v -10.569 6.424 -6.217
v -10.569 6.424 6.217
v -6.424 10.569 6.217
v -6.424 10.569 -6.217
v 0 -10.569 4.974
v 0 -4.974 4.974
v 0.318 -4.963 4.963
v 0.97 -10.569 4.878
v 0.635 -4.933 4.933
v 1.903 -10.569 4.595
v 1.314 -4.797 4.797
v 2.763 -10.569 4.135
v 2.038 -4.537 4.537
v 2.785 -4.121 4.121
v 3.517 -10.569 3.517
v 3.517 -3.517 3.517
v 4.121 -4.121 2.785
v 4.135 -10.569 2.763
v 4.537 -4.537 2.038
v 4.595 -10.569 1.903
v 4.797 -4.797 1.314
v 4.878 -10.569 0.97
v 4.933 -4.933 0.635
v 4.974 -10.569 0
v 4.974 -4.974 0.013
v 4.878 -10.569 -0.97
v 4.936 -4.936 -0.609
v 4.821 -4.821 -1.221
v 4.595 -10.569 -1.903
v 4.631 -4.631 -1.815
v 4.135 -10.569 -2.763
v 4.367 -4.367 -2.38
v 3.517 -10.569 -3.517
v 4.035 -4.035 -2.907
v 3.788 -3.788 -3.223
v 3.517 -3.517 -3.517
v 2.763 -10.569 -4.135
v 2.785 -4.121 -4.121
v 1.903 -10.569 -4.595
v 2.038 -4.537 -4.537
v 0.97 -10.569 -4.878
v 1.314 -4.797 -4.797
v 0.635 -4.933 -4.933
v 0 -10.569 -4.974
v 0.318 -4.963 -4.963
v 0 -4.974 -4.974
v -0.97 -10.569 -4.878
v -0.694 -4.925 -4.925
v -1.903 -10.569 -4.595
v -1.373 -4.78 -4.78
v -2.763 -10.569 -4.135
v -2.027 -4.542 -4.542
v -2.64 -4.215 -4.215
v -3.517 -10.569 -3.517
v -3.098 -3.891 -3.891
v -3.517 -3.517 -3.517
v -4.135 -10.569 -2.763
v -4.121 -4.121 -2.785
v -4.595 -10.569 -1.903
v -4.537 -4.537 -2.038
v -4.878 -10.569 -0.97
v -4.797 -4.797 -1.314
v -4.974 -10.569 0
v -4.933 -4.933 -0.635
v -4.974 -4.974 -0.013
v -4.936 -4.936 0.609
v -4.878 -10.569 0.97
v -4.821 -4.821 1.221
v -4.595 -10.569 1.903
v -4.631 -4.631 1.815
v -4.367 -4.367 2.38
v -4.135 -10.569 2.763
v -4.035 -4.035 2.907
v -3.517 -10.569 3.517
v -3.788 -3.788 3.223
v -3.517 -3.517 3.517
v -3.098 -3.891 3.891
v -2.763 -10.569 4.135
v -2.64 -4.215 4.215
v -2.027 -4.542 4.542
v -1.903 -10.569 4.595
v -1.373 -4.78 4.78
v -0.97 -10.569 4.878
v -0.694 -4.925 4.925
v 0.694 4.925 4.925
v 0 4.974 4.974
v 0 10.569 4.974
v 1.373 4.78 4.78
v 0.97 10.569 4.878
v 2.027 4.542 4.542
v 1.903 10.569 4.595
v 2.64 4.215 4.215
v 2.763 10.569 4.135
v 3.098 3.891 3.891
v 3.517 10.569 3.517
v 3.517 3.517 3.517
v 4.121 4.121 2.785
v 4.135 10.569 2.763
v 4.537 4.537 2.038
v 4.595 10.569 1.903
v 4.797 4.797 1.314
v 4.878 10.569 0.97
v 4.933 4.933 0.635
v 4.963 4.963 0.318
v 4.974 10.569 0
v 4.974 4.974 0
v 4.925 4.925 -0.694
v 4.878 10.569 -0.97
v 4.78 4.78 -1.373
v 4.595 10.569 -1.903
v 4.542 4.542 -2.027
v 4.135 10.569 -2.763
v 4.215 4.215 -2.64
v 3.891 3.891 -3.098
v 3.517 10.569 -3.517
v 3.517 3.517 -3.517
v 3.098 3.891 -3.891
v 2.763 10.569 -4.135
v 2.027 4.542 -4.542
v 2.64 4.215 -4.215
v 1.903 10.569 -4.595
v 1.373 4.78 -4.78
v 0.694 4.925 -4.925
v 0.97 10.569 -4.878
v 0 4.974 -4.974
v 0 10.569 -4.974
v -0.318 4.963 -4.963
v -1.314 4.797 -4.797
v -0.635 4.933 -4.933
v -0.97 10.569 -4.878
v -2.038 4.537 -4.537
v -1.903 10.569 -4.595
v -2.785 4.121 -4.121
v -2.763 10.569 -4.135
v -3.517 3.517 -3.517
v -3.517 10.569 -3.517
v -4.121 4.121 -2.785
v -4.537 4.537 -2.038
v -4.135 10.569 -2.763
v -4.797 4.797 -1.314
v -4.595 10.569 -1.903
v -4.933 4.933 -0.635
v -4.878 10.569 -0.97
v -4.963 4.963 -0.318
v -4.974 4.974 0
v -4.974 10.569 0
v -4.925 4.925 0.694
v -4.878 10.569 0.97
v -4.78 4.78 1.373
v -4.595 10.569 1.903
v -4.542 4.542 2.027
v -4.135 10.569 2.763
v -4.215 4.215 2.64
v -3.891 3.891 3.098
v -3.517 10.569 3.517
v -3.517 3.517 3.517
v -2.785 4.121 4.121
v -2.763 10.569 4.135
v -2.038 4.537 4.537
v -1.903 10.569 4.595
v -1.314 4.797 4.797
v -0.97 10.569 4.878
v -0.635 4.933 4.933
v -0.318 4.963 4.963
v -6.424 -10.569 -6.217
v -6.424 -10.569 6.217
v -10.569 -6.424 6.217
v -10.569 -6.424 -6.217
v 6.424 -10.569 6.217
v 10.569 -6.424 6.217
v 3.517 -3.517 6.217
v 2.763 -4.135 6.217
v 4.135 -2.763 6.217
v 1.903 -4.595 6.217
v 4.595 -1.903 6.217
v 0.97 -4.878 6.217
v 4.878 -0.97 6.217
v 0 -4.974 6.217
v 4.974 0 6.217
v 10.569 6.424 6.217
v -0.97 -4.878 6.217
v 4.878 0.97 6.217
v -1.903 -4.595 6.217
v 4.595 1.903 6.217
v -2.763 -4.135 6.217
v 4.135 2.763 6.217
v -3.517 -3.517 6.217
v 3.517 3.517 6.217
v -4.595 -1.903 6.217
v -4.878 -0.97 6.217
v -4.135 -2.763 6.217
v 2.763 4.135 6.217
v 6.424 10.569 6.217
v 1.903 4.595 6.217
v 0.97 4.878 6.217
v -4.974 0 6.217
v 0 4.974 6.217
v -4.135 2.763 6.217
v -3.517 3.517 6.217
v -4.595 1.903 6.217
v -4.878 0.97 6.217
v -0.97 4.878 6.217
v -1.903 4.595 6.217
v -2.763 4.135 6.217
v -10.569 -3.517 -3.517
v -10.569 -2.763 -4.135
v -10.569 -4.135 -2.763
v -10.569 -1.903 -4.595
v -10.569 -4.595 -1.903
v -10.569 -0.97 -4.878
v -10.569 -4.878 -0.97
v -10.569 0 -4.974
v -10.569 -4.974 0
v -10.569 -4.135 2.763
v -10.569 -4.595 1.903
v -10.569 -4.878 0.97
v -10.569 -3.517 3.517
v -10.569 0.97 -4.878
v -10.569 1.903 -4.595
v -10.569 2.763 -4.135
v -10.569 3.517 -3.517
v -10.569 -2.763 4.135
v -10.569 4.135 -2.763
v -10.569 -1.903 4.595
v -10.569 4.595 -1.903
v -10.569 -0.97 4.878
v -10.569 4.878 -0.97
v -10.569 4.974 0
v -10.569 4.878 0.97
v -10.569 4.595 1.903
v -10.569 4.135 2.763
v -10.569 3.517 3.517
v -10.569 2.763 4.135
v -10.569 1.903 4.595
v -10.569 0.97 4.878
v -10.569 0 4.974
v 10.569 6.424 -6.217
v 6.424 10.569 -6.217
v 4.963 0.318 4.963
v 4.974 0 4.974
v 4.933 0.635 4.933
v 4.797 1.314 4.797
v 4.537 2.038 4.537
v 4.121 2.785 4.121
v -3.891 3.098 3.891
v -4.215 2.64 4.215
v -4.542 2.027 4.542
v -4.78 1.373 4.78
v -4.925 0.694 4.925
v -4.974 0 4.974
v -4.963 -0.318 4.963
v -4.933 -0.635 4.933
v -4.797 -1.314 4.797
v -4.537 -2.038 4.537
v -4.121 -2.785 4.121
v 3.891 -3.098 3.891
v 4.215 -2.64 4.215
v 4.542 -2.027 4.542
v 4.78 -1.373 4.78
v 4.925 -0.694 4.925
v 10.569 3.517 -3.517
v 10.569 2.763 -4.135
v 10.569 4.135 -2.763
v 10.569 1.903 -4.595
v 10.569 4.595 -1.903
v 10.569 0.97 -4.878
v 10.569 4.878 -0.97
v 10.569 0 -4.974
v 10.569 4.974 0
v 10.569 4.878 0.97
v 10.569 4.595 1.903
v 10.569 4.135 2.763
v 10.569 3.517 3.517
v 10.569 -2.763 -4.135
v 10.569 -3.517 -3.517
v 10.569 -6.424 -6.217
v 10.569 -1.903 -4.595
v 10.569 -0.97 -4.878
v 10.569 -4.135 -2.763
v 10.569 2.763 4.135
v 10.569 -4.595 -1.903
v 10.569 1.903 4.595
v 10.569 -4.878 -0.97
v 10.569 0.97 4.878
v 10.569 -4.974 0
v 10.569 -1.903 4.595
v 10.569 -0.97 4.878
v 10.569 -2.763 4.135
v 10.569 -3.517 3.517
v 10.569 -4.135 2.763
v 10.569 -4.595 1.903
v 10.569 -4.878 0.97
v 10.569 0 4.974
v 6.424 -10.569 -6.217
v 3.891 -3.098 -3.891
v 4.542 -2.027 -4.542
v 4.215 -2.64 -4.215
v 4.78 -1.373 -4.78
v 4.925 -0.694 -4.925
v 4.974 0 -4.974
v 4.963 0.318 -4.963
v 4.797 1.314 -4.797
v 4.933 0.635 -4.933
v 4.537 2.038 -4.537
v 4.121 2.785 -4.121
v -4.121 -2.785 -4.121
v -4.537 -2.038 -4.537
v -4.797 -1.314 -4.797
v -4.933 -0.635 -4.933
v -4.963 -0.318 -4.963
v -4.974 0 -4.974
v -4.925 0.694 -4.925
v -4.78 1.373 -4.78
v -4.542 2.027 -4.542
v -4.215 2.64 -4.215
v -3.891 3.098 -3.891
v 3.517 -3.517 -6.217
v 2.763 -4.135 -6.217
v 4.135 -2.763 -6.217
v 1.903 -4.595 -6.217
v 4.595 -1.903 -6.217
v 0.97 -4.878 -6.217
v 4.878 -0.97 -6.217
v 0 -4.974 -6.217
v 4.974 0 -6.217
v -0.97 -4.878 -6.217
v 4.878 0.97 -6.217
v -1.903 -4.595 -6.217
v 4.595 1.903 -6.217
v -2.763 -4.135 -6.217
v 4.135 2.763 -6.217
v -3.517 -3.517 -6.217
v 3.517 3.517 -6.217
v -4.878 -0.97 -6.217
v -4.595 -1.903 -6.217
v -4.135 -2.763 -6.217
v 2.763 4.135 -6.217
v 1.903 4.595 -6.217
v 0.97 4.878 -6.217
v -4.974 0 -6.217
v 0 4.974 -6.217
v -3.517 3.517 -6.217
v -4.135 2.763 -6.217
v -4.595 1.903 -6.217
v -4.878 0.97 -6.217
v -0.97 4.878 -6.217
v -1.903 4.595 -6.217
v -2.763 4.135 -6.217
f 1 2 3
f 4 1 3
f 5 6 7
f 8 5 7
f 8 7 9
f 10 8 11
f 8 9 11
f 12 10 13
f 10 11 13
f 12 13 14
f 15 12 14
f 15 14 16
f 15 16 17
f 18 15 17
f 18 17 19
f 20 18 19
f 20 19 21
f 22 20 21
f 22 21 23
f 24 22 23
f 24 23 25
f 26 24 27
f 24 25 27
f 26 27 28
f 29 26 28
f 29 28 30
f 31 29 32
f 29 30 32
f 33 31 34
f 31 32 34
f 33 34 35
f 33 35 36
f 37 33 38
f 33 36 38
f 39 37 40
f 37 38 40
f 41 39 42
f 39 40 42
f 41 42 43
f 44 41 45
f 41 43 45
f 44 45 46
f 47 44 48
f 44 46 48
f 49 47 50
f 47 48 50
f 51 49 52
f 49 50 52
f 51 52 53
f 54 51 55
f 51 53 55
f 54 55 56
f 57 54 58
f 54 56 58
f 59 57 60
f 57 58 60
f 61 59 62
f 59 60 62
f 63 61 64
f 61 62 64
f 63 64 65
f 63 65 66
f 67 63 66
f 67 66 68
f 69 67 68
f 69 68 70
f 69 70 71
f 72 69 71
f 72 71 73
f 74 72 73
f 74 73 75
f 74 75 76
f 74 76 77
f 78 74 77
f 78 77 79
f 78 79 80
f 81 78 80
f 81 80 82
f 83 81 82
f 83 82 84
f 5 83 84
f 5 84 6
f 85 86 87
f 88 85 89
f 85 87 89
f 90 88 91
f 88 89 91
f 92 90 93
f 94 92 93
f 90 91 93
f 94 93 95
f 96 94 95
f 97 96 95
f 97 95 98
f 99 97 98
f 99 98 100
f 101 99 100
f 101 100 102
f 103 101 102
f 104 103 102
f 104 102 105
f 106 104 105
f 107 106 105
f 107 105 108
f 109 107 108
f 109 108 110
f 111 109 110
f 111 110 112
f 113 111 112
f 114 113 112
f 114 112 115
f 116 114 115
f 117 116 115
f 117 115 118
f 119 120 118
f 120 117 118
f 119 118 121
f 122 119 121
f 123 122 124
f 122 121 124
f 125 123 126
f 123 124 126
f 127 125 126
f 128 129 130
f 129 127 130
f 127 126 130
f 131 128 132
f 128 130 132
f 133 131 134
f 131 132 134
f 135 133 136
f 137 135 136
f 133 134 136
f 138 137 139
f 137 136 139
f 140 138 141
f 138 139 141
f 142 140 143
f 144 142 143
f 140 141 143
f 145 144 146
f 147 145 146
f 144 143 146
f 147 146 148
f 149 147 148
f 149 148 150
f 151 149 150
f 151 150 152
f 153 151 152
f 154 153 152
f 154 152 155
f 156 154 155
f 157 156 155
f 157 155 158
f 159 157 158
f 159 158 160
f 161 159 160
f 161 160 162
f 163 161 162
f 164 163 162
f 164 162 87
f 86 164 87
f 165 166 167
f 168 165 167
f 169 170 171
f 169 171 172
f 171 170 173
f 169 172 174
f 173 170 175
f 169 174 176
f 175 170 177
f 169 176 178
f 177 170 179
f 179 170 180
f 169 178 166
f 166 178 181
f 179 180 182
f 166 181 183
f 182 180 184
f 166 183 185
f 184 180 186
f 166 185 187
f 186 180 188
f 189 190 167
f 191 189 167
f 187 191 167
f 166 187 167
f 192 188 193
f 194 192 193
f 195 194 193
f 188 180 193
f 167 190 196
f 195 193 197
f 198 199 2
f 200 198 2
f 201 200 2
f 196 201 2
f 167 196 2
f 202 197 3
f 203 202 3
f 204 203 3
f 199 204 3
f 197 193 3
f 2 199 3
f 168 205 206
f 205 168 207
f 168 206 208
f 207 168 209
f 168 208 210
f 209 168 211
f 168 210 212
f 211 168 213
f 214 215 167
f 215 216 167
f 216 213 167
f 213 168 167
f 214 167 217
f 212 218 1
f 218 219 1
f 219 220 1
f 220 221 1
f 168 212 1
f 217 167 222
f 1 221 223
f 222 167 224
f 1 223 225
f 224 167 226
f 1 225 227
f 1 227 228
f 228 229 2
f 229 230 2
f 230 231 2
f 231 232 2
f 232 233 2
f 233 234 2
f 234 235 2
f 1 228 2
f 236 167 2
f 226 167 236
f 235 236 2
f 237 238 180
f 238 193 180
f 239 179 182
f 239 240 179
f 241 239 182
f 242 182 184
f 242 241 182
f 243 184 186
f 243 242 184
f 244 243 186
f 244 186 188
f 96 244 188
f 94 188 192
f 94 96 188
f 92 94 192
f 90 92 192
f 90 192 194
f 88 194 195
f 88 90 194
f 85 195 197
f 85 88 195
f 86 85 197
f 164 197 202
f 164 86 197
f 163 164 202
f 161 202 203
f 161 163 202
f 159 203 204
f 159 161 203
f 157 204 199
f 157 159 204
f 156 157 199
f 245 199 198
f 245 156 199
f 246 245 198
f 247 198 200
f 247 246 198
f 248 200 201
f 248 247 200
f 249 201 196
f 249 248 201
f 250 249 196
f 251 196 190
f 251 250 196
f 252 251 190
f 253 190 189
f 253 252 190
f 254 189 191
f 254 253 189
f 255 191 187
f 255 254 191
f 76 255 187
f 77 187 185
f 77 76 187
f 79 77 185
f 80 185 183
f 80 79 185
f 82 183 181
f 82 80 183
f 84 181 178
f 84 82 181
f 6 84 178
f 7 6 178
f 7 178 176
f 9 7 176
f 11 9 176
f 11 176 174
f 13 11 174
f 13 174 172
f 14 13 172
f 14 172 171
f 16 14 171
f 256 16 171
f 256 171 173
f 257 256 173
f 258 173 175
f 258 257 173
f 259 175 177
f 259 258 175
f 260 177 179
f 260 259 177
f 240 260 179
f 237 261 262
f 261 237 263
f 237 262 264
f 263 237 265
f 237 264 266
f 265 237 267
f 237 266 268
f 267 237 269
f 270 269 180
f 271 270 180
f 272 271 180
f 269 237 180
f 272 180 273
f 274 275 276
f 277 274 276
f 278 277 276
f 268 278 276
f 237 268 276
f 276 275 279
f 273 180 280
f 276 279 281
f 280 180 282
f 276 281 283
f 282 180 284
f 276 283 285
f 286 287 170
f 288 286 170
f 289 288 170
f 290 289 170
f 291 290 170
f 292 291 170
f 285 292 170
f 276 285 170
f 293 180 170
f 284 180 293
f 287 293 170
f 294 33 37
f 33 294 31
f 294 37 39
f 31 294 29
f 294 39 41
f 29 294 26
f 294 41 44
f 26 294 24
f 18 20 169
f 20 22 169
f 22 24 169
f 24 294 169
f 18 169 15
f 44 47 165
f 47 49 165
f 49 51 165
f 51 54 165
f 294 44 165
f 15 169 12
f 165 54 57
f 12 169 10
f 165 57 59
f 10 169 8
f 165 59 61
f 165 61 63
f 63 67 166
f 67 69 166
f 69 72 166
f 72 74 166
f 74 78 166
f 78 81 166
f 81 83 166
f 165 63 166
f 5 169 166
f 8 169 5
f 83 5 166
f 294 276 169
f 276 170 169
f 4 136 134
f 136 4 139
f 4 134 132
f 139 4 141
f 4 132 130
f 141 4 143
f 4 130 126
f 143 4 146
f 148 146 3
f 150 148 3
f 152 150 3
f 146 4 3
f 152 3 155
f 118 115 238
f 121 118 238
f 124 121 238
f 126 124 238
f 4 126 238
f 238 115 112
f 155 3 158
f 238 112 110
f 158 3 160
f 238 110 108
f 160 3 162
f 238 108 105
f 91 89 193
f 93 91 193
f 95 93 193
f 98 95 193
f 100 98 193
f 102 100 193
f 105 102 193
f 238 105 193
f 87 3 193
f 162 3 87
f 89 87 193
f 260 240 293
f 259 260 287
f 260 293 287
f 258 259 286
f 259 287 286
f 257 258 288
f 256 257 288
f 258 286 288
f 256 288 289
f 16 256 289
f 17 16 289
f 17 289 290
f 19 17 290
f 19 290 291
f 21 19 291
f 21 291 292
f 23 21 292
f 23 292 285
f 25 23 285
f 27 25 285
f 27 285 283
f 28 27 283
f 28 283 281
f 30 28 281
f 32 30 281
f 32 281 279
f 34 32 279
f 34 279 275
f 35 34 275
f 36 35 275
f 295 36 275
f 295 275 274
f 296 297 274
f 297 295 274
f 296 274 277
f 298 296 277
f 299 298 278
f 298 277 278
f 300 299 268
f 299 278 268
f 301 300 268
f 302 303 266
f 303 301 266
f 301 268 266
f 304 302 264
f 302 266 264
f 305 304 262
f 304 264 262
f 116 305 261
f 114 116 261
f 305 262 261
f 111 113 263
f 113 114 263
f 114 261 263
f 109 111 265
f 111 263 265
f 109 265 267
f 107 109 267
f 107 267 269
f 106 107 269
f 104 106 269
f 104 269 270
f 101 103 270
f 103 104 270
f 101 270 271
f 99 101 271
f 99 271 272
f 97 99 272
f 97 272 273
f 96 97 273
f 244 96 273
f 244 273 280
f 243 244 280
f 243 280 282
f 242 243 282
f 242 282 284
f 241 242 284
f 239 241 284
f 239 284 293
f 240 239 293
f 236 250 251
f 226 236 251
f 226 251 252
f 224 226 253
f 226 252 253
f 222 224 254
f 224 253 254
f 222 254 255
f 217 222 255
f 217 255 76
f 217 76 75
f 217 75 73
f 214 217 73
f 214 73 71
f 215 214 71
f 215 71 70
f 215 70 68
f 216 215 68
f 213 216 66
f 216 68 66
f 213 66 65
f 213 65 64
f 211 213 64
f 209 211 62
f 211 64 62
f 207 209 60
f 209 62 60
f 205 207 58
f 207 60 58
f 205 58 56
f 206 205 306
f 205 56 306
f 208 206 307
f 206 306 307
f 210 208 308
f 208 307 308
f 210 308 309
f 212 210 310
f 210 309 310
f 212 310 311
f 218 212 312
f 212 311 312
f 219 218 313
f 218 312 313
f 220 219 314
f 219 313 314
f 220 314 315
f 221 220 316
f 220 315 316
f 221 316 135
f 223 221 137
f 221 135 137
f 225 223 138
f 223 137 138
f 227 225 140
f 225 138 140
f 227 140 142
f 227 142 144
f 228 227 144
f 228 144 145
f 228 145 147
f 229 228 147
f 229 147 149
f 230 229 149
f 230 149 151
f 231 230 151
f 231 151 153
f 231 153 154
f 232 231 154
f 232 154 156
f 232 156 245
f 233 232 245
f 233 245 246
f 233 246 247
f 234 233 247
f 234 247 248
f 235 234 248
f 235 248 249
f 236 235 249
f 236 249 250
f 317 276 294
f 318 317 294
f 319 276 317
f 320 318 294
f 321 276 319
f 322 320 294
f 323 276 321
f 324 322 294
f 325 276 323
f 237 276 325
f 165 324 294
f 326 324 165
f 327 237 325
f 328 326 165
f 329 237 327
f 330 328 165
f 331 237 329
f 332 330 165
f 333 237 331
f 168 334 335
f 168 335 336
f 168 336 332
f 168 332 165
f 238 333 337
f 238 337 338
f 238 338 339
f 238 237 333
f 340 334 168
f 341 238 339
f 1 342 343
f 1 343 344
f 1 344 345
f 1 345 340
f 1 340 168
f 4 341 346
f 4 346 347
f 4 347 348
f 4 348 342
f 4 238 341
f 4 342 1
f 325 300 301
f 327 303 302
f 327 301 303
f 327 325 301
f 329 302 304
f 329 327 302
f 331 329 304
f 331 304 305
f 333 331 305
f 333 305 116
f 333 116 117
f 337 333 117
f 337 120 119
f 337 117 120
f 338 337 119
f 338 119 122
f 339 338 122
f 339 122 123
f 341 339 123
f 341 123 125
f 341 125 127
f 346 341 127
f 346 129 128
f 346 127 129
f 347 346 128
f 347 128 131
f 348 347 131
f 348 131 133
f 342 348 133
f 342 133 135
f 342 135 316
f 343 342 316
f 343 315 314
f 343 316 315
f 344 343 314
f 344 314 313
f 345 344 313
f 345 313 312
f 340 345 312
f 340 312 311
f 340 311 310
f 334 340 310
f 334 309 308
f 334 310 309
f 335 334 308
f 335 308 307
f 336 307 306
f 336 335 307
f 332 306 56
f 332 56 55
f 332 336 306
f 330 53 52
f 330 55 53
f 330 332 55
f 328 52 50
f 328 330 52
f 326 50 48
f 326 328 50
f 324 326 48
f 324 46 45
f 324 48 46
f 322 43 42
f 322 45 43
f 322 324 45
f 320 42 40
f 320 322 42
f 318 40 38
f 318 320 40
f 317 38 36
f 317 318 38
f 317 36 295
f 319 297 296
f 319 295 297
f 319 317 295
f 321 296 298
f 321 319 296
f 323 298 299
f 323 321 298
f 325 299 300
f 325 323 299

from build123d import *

# Parameters (mm, degrees)
SKETCH1_R           = 6
BOSS_EXTRUDE1_DEPTH = 7.5
SKETCH3_R           = 6
CUT_EXTRUDE1_DEPTH  = 30.479866011
CIRPATTERN1_COUNT   = 4
SCALE1_SCALE        = 0.828947368


with BuildPart() as part:
    # Sketch1 → Boss-Extrude1 (new, symmetric)
    with BuildSketch(Plane.XY):
        Polygon((-12.75, 7.75), (-7.75, 12.75), (7.75, 12.75), (12.75, 7.75), (12.75, -7.75), (7.75, -12.75), (-7.75, -12.75), (-12.75, -7.75), align=None)
        Circle(SKETCH1_R, mode=Mode.SUBTRACT)
    extrude(amount=BOSS_EXTRUDE1_DEPTH, both=True)

    # Sketch3 → Cut-Extrude1 (cut, through all)
    with BuildSketch(Plane(origin=(0, 12.75, 0), x_dir=(1, 0, 0), z_dir=(0, 1, 0))):
        with Locations(Location((0, 0, 0), (0, 0, 270))):
            Circle(SKETCH3_R)
    cut_extrude1 = extrude(amount=-CUT_EXTRUDE1_DEPTH, mode=Mode.SUBTRACT)

    # CirPattern1: Cut-Extrude1 ×4 about axis
    cirpattern1_axis = Axis((0, 0, 7.5), (0, 0, -1))
    for i in range(1, CIRPATTERN1_COUNT):
        add(cut_extrude1.rotate(cirpattern1_axis, i * 360 / CIRPATTERN1_COUNT), mode=Mode.SUBTRACT)


with BuildPart() as part_1:
    # Scale1: scaled about (0, 0, 0)
    add(part.part.scale(SCALE1_SCALE))


solid = part_1.part
